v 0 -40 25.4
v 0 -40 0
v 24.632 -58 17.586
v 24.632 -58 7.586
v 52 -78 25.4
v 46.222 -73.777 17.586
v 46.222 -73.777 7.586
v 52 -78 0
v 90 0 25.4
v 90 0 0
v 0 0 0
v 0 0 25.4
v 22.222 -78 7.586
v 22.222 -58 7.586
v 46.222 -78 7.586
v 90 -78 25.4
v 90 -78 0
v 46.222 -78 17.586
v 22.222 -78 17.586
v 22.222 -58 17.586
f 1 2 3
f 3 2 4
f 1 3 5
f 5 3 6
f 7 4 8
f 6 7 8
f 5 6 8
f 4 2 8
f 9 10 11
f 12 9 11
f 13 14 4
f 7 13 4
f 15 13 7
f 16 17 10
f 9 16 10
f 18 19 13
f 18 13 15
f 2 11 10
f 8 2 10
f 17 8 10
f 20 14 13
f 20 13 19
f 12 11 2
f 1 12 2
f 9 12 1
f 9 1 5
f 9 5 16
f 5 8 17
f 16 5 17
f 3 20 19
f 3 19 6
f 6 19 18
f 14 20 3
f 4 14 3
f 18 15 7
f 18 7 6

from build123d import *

# Parameters (mm, degrees)
F1_DEPTH = 25.4
F2_W     = 24
F2_H     = 10
F3_DEPTH = 20


with BuildPart() as f1:
    # F0 (on Top) → F1 (new body)
    with BuildSketch(Plane.XY):
        Polygon((90, 0), (0, 0), (0, -40), (52, -78), (90, -78), align=None)
    extrude(amount=F1_DEPTH)

    # F2 (on face) → F3 (join)
    with BuildSketch(Plane.XZ.offset(78)):
        with Locations((34.221601, 12.58618)):
            Rectangle(F2_W, F2_H)
    extrude(amount=-F3_DEPTH)


solid = f1.part
